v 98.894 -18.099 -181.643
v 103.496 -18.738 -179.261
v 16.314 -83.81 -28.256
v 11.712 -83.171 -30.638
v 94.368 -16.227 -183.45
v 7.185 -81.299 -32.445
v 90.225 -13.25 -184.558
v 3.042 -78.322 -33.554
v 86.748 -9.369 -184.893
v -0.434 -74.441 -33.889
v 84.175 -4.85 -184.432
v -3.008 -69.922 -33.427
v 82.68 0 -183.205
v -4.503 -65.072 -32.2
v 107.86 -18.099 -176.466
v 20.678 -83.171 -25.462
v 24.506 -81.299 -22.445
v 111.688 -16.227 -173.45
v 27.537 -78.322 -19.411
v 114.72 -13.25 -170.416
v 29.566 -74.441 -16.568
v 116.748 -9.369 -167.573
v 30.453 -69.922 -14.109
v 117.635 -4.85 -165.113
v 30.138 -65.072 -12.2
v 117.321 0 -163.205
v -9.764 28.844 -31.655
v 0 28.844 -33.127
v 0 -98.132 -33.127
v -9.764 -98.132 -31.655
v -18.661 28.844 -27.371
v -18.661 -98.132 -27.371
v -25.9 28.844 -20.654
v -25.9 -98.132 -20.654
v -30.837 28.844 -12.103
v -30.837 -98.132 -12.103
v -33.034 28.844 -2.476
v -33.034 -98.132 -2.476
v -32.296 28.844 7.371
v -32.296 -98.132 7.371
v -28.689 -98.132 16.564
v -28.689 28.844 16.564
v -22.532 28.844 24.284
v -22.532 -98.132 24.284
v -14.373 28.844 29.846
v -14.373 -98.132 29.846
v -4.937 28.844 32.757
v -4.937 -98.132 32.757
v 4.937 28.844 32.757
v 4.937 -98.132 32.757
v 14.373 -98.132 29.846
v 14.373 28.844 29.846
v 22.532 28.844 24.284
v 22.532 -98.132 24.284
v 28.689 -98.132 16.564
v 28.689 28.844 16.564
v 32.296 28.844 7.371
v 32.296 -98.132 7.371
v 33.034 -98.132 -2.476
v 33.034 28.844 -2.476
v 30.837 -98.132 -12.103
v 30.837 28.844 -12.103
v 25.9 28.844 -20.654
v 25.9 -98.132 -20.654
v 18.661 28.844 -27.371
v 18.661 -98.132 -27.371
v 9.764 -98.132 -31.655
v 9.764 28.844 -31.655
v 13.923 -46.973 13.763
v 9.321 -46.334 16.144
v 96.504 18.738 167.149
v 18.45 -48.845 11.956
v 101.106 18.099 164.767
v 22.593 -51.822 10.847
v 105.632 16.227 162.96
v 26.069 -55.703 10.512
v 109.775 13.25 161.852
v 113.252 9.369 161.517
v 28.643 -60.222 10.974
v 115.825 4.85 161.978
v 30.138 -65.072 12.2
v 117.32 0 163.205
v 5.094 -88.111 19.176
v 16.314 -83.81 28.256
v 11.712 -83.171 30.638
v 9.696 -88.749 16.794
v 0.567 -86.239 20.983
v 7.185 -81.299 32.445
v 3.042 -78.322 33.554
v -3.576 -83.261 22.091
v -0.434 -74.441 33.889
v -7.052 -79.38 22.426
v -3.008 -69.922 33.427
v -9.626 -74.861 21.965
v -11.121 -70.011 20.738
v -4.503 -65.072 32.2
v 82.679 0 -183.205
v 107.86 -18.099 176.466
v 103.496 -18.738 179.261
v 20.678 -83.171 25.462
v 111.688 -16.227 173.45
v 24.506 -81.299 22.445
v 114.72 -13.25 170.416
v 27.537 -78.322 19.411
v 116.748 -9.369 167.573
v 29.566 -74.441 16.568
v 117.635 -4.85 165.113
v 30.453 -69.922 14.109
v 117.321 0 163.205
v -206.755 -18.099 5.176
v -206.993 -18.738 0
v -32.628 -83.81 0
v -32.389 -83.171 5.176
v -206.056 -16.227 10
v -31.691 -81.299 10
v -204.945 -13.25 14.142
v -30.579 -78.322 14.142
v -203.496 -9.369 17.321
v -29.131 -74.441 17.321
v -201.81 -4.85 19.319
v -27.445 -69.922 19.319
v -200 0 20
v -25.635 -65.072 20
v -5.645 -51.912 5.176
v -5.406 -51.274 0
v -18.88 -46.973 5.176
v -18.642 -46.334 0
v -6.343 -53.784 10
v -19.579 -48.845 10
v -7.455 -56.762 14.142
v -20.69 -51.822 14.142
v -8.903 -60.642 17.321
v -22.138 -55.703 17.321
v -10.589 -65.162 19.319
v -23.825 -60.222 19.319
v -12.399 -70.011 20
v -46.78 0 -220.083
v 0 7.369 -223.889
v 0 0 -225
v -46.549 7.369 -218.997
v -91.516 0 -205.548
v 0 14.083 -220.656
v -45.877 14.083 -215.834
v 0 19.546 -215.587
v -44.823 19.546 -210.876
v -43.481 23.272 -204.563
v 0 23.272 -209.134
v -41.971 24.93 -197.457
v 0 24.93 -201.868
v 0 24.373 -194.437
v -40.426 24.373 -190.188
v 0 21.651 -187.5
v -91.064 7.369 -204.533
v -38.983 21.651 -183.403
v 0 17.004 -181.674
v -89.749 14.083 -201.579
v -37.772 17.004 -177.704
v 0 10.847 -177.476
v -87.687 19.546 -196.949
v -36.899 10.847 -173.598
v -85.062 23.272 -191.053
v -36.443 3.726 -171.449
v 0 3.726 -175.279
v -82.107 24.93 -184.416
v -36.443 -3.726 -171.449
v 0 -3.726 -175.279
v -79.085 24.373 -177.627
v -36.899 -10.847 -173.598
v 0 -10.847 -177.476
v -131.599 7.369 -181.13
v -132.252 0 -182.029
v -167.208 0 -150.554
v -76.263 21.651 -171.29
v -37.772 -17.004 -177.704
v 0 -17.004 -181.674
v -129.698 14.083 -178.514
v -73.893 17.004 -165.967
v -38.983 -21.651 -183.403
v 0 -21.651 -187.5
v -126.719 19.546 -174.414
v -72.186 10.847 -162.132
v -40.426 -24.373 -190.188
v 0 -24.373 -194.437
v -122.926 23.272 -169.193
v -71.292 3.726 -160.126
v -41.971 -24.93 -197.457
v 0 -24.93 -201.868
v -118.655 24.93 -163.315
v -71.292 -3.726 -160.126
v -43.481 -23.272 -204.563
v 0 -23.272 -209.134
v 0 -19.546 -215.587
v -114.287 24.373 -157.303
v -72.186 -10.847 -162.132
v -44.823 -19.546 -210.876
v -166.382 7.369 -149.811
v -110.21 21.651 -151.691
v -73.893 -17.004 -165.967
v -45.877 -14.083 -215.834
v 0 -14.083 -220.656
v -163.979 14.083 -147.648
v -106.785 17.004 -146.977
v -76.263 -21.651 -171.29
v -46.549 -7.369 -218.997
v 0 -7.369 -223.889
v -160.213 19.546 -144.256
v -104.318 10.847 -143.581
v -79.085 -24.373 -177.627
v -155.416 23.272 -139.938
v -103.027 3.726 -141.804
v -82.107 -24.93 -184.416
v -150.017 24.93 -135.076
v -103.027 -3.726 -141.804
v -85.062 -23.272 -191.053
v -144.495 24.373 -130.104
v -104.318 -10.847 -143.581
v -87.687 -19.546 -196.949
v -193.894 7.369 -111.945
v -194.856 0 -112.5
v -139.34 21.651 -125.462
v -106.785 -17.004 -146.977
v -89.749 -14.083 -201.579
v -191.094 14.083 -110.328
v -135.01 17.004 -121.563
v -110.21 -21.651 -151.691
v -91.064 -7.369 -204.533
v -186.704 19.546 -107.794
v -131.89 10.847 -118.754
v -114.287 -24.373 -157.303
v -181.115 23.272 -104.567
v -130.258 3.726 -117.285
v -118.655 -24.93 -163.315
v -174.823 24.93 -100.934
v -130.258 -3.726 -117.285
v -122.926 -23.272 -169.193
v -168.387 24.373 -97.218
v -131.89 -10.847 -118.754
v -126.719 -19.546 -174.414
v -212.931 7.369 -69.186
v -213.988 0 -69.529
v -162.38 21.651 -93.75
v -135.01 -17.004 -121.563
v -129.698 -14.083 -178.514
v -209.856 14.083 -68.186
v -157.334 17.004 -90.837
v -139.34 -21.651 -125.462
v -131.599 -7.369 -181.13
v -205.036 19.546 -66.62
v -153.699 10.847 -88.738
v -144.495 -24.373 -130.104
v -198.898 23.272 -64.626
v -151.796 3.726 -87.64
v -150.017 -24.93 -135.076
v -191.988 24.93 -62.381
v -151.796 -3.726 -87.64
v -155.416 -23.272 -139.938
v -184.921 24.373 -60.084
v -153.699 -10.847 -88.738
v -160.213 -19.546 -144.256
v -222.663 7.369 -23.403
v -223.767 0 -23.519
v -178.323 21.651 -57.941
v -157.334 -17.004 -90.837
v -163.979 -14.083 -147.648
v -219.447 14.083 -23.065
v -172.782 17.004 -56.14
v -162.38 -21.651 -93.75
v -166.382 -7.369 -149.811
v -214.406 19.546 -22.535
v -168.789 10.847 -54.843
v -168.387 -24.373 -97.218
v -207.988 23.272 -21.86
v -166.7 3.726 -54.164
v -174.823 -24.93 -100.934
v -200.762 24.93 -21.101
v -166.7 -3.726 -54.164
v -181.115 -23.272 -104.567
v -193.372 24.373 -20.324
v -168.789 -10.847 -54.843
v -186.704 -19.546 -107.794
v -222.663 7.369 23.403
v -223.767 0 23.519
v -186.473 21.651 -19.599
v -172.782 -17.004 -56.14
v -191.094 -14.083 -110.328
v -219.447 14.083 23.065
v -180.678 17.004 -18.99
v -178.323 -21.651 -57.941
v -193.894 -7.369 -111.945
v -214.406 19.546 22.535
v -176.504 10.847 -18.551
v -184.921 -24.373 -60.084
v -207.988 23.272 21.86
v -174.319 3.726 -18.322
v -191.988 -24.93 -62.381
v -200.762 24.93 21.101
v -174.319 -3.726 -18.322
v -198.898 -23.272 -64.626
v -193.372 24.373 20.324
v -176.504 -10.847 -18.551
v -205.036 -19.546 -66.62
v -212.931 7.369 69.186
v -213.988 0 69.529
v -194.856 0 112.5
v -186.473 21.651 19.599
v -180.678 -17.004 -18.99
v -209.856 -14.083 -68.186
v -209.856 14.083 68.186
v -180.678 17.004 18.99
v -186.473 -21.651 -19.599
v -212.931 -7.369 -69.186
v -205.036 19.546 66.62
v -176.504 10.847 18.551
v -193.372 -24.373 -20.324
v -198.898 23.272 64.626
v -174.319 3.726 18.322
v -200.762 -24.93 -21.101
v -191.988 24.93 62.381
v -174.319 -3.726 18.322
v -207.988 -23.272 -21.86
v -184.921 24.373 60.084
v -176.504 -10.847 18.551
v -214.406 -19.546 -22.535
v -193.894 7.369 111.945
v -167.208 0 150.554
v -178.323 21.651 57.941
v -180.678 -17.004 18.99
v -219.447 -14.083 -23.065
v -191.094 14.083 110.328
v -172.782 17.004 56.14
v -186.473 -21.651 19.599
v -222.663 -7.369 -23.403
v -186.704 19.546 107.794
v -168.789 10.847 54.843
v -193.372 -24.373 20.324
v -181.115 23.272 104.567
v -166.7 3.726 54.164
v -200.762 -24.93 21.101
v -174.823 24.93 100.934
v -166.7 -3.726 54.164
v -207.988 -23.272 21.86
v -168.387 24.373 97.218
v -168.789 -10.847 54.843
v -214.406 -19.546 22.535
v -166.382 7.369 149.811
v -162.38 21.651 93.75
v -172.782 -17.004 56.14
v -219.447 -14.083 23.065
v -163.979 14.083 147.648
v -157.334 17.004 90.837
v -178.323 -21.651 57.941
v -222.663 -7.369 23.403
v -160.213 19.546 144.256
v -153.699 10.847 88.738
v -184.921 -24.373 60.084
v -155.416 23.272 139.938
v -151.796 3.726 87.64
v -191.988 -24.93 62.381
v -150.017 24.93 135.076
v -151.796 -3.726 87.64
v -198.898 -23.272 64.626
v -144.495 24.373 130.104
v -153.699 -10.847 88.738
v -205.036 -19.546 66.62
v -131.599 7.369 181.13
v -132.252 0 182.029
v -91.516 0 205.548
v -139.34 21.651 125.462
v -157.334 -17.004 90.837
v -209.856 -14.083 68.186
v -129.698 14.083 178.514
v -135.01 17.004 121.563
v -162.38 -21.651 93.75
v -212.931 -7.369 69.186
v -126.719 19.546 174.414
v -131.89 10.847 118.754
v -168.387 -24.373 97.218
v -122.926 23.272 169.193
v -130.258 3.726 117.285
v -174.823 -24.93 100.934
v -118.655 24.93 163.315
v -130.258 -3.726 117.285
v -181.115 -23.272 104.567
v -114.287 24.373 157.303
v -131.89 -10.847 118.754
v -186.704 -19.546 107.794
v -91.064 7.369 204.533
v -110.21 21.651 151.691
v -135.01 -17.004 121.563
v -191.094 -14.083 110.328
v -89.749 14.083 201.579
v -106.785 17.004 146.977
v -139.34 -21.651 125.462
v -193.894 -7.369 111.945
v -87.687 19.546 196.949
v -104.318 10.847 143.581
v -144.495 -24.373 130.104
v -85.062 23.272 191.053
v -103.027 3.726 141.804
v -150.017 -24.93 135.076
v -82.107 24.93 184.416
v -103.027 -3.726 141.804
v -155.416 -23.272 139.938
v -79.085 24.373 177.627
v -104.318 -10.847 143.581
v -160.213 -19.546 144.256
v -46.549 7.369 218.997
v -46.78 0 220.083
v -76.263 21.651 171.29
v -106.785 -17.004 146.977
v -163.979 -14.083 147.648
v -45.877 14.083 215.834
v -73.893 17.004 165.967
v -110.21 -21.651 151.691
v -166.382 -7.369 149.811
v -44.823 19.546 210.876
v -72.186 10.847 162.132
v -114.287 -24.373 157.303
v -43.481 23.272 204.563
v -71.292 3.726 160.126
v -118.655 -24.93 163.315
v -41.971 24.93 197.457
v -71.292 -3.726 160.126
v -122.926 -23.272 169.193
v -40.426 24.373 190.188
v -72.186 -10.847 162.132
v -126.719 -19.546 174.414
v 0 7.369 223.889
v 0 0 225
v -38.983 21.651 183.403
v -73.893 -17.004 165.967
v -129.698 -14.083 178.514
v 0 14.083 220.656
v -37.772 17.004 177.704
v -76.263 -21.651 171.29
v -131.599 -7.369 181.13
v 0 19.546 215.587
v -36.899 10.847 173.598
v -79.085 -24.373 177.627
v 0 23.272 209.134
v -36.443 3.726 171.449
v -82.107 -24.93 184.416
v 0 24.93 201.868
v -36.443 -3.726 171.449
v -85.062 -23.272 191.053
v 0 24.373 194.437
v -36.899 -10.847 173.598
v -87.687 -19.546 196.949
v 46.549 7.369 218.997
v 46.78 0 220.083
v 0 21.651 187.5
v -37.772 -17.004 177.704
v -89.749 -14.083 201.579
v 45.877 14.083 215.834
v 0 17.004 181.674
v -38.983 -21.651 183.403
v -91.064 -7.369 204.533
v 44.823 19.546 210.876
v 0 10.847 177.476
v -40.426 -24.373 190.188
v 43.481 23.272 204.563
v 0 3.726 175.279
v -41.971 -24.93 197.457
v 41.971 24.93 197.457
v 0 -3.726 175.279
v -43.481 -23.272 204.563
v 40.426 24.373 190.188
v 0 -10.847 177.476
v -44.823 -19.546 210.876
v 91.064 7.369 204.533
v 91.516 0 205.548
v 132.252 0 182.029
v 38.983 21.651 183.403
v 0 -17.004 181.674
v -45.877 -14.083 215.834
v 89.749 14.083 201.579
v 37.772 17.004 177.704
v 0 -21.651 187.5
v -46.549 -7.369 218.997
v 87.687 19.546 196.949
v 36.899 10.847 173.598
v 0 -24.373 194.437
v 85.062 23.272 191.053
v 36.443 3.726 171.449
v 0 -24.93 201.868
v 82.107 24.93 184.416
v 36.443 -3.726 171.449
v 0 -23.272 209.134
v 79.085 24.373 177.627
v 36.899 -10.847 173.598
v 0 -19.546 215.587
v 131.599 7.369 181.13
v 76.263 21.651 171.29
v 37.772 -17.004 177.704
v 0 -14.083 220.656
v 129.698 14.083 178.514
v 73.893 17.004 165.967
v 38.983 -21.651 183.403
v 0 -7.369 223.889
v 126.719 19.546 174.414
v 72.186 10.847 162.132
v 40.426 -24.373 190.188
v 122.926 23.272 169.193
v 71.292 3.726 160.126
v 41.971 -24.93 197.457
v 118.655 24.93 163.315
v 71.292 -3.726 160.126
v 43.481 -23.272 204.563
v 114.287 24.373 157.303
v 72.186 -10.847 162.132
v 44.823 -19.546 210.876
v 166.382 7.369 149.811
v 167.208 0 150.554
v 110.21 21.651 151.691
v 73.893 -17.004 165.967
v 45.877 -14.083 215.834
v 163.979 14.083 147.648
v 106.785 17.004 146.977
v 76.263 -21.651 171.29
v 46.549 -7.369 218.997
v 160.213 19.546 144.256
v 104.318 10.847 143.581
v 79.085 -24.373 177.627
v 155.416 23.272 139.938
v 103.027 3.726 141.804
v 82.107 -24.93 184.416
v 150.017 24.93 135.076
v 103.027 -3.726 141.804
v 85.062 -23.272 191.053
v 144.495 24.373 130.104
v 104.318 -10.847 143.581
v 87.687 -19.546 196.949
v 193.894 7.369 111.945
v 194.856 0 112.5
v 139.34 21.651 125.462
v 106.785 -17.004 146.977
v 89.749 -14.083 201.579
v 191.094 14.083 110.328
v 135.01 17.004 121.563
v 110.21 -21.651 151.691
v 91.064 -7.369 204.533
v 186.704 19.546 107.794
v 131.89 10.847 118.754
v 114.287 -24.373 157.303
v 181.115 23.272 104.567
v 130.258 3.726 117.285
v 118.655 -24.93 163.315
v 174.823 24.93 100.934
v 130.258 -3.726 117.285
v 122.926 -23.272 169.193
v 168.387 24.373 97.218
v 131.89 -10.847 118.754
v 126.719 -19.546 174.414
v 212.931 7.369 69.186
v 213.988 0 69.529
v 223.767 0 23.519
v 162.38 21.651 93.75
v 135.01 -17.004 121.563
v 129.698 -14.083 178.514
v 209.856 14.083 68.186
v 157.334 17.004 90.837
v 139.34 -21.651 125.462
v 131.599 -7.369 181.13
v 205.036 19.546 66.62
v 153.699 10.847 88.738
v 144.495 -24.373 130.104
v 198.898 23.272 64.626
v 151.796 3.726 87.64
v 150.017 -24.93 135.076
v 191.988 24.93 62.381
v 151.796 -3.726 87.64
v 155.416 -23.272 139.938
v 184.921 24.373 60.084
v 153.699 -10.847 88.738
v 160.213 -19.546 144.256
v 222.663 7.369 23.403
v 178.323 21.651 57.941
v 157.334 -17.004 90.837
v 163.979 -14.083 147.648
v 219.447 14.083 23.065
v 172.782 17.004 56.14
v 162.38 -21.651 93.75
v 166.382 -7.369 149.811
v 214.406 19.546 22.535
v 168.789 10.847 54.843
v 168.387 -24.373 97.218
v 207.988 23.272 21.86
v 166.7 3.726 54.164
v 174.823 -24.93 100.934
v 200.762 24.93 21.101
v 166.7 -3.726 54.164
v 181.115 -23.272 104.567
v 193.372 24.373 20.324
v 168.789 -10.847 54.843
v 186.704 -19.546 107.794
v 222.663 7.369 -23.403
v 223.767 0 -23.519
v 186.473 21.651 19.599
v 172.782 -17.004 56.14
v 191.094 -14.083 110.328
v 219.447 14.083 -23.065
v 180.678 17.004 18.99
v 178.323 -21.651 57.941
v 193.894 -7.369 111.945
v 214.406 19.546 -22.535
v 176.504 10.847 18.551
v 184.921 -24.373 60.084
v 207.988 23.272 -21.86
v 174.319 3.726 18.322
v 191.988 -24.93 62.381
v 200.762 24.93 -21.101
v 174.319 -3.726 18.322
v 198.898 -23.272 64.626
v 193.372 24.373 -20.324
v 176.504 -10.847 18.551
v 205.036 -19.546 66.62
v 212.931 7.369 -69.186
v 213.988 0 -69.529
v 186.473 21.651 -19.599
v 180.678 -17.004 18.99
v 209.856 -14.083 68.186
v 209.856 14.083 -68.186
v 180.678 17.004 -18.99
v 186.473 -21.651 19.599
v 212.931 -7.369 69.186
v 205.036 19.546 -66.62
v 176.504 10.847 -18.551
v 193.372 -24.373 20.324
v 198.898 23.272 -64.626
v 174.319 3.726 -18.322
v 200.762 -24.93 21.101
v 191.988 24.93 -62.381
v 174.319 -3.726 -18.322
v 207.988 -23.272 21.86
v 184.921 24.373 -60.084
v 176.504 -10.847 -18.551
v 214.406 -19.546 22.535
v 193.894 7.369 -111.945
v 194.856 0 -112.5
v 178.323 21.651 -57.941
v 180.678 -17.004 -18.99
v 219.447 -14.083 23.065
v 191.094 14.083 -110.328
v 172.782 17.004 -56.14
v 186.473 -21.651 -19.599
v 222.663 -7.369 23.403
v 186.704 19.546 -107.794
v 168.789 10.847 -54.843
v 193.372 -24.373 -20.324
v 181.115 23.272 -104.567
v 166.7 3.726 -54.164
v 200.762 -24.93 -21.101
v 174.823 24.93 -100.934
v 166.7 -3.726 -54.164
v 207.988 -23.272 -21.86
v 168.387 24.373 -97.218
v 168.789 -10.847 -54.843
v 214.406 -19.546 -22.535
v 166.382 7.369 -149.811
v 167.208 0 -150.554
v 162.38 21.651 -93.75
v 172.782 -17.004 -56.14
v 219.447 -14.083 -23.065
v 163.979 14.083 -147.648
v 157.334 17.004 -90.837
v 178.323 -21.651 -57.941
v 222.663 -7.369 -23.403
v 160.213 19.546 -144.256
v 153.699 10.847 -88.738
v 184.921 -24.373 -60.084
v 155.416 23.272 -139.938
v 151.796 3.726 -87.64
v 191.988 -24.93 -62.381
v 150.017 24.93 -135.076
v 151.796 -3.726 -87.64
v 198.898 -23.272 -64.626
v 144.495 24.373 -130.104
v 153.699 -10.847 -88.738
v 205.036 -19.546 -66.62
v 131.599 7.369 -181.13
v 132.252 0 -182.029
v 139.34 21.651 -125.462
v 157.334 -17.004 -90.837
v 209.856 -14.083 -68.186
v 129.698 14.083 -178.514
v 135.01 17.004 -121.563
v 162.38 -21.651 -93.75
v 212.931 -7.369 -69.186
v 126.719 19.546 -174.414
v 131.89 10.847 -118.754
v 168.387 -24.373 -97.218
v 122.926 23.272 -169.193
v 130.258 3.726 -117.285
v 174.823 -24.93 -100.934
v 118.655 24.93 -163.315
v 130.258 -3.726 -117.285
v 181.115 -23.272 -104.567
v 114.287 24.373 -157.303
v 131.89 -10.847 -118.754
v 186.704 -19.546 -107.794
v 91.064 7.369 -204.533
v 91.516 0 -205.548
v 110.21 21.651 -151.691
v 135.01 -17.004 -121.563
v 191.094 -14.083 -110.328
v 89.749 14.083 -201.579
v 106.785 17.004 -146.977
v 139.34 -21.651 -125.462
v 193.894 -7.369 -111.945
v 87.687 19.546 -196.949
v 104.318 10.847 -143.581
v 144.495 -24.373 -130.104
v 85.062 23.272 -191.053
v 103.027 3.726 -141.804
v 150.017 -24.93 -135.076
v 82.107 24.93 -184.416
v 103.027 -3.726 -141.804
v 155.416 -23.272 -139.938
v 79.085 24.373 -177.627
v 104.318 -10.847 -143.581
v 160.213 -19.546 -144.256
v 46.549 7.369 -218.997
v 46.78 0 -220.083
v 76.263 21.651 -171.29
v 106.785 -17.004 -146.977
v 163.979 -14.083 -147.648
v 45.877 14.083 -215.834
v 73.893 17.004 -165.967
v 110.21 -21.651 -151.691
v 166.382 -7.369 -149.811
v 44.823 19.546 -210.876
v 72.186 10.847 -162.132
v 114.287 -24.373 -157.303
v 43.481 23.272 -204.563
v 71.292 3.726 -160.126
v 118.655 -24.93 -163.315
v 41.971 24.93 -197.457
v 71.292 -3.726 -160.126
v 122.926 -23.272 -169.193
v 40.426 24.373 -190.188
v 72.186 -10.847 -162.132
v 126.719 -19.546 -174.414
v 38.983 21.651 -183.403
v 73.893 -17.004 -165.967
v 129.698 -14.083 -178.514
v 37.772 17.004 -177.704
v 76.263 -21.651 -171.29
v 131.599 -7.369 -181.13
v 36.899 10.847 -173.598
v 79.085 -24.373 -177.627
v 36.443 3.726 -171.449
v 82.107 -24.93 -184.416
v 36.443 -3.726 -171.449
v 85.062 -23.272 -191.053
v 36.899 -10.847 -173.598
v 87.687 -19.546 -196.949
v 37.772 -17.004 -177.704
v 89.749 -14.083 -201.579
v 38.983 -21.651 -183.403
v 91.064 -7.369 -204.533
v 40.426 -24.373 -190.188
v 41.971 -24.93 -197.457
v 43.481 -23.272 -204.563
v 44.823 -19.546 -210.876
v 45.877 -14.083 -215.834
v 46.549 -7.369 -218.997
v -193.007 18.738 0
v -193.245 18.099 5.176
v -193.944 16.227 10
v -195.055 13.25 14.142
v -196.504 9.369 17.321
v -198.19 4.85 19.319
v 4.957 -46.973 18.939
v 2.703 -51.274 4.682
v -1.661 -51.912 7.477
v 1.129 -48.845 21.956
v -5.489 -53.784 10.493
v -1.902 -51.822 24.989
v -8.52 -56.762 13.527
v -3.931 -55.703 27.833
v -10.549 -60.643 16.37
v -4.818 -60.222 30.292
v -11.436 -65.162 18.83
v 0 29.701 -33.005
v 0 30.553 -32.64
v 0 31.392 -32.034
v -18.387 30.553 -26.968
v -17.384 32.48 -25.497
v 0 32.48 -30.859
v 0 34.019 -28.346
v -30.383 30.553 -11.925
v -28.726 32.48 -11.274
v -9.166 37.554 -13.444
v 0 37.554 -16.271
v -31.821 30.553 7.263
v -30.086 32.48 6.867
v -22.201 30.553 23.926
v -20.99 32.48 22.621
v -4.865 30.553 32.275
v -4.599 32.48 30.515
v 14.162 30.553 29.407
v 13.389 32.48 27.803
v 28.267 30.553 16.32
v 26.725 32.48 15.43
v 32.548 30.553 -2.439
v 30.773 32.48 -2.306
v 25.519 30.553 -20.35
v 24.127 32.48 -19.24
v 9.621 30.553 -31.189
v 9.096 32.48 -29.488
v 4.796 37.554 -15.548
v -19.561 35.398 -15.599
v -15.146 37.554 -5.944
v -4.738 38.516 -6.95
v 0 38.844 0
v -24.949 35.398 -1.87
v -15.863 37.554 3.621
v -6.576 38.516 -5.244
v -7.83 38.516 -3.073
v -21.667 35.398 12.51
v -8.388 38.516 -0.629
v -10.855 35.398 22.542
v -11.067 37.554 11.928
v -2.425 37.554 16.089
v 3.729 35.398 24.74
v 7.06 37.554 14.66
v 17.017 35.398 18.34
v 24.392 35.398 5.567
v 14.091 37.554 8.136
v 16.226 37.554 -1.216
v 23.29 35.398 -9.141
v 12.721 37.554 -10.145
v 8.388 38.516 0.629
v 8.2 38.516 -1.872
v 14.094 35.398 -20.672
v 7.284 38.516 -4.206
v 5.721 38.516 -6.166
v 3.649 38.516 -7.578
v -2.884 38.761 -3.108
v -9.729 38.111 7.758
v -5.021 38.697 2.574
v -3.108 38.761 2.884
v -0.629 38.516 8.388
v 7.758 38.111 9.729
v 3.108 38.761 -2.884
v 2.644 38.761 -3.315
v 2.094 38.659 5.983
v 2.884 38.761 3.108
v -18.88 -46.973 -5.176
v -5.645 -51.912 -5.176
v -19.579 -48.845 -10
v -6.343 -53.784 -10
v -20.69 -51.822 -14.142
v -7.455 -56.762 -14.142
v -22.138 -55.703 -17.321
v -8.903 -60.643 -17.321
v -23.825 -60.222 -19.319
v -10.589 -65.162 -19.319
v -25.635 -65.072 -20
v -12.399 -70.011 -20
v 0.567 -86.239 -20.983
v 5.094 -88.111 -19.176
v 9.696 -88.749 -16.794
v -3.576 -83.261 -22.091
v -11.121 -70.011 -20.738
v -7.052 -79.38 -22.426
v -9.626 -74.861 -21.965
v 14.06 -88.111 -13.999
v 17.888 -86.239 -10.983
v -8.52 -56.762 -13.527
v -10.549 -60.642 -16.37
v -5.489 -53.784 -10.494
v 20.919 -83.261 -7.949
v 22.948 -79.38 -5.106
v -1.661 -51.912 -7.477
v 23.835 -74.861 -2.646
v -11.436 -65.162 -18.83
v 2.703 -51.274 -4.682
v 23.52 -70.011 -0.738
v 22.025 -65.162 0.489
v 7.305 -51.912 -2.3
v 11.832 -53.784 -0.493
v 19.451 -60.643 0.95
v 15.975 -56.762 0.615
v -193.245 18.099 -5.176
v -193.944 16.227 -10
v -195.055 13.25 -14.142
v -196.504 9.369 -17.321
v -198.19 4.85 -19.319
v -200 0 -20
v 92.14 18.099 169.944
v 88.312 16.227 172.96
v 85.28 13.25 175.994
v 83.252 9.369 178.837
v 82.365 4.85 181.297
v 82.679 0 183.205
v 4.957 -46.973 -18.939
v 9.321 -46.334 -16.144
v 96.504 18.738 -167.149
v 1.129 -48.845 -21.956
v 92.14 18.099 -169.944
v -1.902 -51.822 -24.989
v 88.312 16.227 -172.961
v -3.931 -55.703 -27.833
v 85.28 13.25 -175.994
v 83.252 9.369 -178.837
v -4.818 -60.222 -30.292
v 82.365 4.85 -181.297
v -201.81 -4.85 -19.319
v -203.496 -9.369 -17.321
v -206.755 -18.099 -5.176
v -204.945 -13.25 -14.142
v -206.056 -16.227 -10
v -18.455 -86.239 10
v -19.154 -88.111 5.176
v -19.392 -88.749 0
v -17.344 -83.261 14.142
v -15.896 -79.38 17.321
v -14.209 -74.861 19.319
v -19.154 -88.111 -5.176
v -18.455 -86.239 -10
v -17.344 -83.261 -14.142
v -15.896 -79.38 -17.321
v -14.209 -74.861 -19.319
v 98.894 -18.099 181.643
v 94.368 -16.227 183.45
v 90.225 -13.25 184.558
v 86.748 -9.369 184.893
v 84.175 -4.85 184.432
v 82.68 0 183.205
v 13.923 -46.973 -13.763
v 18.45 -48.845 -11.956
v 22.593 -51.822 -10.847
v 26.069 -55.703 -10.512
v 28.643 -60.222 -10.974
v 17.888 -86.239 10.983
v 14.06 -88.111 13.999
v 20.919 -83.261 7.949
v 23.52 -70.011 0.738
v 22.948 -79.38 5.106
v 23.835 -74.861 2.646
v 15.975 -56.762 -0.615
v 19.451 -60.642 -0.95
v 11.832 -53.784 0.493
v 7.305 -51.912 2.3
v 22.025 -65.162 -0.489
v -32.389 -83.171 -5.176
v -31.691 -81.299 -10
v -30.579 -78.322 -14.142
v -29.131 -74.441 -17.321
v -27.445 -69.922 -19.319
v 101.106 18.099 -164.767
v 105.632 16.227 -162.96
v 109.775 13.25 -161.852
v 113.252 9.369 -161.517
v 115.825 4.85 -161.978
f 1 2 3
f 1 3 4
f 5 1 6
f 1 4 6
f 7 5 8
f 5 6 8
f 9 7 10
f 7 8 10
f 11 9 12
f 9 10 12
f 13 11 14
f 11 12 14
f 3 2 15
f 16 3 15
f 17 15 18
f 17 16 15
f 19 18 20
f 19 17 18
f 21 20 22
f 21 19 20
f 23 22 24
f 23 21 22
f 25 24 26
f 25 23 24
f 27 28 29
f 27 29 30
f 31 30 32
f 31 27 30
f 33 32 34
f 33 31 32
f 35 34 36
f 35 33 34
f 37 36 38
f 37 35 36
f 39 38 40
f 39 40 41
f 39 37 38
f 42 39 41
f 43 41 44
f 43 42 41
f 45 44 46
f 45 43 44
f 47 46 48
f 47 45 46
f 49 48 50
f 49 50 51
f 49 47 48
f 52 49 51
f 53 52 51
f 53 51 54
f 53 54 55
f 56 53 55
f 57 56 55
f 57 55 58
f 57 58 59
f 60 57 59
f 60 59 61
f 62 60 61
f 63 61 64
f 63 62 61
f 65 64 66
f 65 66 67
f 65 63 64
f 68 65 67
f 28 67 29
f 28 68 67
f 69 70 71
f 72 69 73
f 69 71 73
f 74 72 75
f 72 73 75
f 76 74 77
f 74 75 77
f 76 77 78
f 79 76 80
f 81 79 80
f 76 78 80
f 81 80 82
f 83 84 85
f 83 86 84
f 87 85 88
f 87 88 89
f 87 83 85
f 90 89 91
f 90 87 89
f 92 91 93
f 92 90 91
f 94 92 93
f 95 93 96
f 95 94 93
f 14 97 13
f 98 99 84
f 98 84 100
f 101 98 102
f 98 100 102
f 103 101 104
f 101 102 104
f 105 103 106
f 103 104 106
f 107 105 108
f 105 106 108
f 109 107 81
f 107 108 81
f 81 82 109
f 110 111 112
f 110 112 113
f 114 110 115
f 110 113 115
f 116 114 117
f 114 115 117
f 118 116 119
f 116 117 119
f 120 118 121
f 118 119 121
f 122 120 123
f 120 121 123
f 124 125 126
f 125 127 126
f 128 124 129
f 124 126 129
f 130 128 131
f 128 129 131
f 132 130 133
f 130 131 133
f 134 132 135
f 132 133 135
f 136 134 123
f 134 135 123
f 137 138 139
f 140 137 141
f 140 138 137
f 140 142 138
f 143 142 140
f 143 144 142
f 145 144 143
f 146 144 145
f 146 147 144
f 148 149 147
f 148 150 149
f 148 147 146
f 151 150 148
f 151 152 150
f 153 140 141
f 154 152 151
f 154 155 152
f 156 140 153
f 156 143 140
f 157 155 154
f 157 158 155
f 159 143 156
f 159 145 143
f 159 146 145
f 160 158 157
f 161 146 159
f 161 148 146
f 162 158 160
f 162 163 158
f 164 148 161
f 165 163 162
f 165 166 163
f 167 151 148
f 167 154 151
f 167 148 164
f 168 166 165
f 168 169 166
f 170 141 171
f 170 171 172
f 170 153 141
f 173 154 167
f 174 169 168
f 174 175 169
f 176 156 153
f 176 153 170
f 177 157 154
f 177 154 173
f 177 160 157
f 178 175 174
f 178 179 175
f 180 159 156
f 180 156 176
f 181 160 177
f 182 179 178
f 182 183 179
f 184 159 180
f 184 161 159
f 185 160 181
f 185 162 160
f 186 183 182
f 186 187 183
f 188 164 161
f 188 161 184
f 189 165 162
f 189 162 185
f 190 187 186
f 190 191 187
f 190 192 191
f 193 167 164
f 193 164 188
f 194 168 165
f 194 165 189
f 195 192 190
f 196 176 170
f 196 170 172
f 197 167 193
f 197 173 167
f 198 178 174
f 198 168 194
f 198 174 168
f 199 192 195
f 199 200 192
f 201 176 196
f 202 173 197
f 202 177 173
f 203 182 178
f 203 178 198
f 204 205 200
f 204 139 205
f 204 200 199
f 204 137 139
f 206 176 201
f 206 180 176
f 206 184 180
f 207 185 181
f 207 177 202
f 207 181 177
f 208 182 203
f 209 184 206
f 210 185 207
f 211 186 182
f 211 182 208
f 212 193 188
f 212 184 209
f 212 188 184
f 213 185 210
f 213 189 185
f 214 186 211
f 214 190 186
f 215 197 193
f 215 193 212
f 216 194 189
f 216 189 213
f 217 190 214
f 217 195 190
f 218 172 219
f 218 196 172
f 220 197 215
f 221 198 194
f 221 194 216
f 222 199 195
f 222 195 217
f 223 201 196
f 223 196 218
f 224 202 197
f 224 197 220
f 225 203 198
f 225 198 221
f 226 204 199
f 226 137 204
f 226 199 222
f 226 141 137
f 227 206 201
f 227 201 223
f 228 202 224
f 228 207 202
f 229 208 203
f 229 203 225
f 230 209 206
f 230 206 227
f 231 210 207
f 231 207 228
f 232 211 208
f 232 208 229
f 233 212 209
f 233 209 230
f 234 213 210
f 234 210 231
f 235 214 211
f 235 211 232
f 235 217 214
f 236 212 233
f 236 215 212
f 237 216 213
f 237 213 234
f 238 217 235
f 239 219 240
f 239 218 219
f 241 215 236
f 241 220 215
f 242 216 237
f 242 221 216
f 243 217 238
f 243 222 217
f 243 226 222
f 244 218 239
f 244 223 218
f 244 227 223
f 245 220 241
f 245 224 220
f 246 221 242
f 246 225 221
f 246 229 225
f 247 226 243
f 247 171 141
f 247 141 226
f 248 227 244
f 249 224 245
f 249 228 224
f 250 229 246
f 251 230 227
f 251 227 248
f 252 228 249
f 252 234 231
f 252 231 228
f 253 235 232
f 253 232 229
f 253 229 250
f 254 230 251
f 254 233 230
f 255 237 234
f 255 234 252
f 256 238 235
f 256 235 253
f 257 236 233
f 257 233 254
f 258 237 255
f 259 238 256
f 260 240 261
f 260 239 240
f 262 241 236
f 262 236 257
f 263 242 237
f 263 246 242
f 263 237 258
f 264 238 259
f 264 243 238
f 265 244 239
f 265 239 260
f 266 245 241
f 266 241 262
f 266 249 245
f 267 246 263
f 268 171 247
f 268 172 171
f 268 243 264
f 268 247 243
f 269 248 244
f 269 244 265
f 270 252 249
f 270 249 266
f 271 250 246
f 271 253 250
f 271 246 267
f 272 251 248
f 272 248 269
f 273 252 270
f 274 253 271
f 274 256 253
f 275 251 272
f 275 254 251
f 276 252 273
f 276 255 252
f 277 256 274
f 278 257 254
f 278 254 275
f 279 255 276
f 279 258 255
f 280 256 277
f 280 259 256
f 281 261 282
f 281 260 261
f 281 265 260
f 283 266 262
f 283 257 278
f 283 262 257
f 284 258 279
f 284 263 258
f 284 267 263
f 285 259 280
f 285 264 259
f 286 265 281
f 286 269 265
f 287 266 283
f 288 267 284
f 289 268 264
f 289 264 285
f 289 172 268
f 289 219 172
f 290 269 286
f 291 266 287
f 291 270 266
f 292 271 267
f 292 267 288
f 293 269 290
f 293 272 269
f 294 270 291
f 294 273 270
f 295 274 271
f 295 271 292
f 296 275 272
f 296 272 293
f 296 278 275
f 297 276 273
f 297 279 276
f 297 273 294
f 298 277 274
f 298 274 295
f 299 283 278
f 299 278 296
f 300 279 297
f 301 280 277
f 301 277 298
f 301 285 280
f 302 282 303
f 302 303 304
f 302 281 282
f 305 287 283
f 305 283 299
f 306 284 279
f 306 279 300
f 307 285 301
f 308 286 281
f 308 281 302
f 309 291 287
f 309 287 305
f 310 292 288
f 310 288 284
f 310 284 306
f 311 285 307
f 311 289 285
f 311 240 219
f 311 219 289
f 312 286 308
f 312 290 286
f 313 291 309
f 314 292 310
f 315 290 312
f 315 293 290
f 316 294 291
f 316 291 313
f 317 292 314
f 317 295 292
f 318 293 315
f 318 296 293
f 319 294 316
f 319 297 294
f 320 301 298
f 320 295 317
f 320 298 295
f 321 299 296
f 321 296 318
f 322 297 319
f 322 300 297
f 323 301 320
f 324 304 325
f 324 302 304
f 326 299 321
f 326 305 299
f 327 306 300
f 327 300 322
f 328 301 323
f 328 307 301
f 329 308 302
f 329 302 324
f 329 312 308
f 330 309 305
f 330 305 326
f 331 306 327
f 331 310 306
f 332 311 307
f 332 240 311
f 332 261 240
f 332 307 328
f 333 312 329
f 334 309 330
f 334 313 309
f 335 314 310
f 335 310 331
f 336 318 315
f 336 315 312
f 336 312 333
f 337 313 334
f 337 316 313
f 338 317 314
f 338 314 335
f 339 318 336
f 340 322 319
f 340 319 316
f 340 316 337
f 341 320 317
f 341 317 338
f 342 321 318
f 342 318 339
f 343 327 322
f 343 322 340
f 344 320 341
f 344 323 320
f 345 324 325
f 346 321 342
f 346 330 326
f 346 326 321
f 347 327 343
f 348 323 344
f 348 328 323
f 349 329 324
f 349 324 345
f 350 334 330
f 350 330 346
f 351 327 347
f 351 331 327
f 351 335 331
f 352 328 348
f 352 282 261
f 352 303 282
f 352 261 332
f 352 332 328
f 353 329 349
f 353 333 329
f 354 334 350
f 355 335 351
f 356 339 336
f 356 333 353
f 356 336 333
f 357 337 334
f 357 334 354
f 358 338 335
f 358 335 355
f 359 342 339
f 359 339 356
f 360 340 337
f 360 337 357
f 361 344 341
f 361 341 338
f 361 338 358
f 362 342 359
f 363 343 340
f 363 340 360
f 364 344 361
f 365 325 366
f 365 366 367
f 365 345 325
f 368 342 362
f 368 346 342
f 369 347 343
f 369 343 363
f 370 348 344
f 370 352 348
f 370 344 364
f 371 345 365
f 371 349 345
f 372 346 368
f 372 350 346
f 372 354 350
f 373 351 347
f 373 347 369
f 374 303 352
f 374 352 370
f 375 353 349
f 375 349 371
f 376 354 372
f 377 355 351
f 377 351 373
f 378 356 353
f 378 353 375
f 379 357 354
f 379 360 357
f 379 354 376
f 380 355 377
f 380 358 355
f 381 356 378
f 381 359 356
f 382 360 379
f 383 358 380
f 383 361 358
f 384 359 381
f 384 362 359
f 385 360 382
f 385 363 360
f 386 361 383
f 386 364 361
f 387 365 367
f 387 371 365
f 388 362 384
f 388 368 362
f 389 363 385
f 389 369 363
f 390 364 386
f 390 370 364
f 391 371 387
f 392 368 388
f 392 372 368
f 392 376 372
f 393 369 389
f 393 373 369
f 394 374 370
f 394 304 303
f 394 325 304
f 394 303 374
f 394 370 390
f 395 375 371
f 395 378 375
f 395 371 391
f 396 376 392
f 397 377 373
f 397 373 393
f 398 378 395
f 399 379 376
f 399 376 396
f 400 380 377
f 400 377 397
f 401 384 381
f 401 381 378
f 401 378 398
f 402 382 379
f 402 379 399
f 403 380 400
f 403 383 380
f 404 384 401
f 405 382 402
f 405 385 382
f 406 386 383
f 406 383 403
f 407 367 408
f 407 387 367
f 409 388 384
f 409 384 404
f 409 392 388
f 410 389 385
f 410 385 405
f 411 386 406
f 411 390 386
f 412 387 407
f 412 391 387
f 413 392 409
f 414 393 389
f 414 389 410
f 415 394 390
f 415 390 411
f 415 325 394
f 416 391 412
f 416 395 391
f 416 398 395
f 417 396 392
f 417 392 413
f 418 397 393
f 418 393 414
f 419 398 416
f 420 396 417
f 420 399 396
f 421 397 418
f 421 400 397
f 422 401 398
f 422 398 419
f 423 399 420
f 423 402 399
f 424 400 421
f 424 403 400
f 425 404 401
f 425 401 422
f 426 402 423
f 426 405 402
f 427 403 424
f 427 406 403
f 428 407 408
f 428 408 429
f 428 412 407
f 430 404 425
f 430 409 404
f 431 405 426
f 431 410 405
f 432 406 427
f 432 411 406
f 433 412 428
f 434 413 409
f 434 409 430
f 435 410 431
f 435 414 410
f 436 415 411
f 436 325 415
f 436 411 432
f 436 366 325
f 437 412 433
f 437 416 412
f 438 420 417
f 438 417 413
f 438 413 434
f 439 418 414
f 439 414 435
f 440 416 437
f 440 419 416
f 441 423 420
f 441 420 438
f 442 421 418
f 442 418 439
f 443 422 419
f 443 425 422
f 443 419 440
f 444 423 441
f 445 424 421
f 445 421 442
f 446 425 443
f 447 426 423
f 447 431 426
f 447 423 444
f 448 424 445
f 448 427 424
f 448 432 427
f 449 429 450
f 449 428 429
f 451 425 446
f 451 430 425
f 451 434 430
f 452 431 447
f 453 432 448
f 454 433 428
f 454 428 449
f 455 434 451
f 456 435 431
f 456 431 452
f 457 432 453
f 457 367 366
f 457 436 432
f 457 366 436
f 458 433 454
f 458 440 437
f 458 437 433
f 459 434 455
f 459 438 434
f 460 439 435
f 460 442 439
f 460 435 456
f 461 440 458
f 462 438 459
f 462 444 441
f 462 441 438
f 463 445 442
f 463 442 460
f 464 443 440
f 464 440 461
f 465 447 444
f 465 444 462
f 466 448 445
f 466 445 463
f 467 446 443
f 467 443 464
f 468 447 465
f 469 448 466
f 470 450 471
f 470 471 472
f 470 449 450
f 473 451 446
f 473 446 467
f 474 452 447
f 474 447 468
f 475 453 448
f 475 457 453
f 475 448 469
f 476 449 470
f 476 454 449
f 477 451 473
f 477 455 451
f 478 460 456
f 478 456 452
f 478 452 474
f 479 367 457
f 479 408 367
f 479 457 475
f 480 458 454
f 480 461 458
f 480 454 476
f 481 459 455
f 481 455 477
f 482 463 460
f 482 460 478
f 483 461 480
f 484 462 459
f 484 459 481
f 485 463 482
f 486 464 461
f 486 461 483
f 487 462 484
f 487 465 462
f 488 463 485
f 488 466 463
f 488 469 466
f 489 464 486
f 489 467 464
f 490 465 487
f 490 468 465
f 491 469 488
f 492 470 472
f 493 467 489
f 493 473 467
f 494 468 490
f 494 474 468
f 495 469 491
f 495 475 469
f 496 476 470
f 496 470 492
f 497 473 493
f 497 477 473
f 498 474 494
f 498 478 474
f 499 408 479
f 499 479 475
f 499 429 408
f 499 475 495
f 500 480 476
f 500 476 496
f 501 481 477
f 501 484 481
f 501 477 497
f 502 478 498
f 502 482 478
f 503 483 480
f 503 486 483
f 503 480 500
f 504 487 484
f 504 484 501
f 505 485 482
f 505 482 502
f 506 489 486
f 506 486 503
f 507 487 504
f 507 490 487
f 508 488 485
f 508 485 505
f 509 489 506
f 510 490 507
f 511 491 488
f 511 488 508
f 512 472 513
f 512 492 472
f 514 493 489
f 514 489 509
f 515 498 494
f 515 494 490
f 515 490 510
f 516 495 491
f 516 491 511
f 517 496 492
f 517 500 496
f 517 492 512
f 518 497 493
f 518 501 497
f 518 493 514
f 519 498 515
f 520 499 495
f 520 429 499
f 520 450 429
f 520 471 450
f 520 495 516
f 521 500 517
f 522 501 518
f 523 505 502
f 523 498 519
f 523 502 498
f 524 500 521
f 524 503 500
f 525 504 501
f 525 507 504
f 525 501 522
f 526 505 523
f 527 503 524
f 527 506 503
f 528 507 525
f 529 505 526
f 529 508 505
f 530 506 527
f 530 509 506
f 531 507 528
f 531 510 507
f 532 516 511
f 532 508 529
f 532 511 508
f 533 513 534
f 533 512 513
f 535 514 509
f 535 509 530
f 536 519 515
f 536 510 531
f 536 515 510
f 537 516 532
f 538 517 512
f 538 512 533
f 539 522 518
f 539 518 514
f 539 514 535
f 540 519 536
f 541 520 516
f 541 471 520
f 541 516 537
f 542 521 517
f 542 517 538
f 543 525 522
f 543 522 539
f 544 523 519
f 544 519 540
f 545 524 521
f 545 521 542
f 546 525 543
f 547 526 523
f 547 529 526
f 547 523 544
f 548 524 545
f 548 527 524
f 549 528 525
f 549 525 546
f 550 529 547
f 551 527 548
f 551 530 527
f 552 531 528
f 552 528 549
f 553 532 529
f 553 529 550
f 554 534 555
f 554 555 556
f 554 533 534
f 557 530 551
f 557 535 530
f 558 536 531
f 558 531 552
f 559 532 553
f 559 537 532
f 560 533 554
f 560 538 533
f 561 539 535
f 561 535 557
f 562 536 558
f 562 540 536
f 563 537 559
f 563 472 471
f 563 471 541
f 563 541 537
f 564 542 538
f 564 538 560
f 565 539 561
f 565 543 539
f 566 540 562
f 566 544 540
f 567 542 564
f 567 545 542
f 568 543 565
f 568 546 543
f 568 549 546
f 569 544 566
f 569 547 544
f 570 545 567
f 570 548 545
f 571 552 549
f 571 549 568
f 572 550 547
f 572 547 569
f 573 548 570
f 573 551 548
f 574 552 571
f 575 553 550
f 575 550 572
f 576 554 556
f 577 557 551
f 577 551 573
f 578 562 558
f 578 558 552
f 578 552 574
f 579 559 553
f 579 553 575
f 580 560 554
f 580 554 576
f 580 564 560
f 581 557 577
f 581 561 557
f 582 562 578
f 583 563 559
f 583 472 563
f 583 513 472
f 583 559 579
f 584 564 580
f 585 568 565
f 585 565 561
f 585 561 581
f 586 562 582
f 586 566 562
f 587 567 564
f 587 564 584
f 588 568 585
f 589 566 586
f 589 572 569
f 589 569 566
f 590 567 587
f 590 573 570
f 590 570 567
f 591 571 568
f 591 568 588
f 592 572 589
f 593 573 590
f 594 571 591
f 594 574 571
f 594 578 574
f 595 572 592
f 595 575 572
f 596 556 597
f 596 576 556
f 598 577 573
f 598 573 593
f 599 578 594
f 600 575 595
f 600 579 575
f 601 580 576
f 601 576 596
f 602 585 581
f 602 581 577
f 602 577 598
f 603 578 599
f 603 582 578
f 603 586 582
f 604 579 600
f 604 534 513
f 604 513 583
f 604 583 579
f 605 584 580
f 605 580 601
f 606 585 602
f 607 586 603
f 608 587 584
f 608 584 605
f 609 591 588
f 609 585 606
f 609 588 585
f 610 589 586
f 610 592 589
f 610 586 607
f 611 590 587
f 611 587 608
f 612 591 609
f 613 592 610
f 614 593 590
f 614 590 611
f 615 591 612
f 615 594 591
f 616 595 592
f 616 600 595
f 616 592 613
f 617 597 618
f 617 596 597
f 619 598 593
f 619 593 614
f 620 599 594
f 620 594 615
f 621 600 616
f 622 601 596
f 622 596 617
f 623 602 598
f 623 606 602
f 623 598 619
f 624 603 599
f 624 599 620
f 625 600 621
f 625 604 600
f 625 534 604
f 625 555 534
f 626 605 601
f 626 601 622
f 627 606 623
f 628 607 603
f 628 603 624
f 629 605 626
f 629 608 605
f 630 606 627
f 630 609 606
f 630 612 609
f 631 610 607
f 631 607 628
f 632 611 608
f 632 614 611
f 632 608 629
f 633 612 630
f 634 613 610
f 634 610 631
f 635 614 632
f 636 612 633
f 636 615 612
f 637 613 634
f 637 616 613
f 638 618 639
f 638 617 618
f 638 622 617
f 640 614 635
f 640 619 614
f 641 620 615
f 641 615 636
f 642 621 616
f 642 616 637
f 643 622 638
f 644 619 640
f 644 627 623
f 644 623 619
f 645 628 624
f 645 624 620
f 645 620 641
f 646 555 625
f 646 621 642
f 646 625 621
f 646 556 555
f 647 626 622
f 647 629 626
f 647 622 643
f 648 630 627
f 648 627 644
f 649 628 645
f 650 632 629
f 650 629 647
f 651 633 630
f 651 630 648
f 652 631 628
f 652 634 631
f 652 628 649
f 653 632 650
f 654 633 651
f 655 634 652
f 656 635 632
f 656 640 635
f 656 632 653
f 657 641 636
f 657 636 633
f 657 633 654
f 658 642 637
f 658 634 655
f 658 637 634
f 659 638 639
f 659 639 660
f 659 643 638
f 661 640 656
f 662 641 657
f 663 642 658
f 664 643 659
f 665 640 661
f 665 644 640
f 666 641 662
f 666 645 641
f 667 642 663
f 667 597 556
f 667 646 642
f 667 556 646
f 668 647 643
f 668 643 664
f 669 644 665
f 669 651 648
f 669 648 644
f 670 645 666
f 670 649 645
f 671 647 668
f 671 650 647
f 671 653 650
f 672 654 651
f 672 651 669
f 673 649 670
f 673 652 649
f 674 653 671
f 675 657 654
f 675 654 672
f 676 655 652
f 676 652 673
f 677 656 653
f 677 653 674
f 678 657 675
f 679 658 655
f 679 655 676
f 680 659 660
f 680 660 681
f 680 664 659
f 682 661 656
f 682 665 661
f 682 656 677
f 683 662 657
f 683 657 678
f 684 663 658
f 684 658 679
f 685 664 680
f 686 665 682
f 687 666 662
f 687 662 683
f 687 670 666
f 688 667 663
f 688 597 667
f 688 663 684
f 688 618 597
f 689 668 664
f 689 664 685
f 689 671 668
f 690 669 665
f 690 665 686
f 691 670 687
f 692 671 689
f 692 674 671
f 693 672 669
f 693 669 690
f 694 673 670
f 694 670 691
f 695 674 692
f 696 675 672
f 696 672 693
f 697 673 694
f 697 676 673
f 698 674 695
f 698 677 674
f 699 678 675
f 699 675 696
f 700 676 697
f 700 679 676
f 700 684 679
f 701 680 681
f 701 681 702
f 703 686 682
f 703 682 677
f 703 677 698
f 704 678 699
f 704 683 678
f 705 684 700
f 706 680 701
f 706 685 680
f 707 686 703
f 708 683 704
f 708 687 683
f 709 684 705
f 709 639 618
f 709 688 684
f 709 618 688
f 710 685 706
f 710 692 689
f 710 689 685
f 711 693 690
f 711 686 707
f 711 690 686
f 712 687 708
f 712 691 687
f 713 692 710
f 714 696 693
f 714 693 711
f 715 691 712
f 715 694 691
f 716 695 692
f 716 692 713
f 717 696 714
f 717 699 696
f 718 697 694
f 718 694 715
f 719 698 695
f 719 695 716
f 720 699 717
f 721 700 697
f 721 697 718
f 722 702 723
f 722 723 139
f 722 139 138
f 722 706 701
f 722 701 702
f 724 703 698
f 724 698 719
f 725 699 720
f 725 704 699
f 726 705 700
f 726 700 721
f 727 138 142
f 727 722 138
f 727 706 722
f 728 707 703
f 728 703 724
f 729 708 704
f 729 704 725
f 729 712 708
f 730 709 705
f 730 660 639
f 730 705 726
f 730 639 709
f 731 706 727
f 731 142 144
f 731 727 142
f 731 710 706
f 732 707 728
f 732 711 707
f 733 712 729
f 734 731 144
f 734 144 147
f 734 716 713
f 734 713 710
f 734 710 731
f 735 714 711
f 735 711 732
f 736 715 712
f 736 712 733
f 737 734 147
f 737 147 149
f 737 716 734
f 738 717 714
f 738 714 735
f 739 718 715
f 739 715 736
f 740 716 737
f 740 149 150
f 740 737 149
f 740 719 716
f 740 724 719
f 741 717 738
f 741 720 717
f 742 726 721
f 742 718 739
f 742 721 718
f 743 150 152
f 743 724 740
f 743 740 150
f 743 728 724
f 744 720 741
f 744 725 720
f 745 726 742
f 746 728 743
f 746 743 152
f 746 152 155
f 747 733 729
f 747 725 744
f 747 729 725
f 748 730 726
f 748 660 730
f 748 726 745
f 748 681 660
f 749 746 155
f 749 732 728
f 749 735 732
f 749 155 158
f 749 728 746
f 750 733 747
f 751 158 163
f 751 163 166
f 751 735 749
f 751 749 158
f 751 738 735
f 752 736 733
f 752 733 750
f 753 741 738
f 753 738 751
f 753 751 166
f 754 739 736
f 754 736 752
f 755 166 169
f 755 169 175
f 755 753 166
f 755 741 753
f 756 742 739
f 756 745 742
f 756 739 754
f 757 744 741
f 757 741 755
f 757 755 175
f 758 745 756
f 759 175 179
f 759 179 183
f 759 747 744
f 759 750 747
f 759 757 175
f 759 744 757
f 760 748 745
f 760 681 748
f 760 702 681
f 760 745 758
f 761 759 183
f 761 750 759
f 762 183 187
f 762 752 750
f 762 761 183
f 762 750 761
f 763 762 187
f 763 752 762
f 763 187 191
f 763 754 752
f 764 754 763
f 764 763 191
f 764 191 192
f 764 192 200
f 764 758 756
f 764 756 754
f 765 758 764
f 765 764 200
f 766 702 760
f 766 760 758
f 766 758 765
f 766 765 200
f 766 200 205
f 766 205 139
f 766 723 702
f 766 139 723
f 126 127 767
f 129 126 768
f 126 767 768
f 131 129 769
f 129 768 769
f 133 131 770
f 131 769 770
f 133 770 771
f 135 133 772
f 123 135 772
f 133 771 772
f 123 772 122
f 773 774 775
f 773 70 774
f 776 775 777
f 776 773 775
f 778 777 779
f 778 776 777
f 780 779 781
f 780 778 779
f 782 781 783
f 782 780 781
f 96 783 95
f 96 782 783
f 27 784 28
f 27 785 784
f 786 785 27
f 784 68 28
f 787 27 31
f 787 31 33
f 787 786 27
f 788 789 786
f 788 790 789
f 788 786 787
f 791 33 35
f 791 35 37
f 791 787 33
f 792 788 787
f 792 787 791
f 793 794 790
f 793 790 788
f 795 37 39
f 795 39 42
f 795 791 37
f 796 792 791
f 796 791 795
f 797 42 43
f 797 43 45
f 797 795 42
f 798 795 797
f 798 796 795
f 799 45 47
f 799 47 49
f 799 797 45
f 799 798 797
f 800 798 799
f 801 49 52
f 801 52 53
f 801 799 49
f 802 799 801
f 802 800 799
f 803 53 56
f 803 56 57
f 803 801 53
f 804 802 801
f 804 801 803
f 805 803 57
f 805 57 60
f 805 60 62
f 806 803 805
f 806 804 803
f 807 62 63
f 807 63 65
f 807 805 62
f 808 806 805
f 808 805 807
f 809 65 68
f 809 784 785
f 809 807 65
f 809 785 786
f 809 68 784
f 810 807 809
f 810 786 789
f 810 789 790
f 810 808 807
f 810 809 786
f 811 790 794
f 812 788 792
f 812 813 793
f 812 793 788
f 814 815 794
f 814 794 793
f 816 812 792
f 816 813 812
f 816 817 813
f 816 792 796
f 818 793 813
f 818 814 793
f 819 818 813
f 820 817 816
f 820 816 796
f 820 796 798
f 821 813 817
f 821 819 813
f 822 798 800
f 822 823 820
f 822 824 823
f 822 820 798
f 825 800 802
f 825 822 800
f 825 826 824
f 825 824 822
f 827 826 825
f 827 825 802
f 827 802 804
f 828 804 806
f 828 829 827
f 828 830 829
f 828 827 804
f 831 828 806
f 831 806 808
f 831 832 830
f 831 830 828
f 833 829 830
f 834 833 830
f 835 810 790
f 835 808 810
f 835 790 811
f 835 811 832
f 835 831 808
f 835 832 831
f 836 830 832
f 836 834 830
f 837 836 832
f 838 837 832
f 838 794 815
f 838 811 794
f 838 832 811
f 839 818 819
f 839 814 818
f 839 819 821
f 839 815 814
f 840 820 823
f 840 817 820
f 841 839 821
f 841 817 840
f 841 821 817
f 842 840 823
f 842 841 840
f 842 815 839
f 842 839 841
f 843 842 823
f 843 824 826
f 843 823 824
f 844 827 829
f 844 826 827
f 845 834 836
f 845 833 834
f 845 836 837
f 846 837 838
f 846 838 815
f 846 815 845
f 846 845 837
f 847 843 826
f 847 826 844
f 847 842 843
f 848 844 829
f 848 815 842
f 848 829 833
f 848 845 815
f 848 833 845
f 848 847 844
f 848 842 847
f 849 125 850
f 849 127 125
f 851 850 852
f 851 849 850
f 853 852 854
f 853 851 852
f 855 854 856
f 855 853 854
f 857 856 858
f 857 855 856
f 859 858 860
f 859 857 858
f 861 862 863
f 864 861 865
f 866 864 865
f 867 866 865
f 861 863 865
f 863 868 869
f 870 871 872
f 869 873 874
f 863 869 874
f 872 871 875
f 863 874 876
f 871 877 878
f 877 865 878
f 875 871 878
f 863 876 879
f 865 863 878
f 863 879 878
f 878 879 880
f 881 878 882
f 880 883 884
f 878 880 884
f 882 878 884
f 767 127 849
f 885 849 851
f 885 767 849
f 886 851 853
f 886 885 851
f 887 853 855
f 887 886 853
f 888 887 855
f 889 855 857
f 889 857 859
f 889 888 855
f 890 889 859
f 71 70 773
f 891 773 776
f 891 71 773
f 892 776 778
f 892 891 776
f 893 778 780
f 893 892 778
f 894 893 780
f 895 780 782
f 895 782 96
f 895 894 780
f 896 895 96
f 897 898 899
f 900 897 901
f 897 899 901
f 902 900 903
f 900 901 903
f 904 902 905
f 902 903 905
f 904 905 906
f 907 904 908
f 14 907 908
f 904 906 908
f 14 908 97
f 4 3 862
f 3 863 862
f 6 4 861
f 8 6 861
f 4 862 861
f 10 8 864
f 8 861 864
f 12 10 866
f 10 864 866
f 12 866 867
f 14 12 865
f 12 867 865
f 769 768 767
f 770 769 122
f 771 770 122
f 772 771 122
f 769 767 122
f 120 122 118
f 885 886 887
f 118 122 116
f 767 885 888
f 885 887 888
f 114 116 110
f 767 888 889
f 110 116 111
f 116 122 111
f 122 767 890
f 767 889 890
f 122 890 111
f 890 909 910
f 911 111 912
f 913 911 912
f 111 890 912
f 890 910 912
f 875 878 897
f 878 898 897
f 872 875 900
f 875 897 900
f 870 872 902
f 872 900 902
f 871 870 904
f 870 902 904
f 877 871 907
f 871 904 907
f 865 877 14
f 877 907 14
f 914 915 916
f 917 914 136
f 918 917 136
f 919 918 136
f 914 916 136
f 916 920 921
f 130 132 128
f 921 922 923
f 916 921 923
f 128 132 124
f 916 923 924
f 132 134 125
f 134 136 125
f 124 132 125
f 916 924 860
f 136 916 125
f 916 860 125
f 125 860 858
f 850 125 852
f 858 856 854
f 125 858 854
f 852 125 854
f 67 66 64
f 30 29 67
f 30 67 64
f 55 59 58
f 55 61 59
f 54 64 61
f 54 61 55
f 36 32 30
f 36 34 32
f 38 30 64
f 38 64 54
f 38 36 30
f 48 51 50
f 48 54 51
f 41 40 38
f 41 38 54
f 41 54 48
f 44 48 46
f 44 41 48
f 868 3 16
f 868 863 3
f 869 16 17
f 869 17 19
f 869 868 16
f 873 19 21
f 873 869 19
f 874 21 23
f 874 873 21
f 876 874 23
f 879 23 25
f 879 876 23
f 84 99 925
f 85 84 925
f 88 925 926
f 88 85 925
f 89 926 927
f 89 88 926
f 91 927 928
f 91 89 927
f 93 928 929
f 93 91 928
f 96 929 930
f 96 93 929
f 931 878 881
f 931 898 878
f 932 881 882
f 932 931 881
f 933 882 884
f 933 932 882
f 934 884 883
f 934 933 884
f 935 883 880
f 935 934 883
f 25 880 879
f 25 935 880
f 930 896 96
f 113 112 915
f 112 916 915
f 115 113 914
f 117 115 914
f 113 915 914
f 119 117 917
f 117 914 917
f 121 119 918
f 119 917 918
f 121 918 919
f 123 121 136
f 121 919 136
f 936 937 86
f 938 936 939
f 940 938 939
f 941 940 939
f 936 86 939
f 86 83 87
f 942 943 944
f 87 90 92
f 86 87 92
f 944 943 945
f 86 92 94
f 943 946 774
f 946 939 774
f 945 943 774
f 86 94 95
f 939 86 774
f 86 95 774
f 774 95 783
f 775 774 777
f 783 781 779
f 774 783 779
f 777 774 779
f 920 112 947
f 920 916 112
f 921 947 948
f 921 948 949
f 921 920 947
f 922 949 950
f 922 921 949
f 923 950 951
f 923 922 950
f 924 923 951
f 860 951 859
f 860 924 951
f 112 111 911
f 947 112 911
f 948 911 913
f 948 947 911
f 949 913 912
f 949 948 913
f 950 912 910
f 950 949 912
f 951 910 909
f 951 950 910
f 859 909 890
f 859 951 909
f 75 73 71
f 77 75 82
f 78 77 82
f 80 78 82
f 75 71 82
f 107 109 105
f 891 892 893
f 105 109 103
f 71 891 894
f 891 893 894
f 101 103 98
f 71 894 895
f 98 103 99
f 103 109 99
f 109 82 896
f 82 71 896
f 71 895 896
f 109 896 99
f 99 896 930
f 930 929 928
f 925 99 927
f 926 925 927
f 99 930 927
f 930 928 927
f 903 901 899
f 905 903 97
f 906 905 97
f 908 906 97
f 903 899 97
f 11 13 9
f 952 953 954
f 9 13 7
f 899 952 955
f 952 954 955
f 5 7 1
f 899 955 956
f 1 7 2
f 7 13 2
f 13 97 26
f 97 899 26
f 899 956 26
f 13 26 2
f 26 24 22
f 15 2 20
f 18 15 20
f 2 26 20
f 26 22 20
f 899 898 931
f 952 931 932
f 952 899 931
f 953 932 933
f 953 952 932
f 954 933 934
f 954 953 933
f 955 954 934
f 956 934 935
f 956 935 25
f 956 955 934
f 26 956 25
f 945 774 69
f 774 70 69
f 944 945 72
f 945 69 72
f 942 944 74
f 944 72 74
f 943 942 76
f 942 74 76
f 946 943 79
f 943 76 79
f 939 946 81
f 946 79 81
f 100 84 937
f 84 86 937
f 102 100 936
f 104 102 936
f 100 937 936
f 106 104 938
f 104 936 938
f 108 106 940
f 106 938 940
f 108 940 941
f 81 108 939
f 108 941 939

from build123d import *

# Parameters (mm, degrees)
SKETCH1_R                = 25
SKETCH1_W                = 33.127050545
SKETCH1_H                = 126.975324737
DOME1_FACE_RADIUS        = 33.127050545
DOME1_HEIGHT             = 10
BOSS_EXTRUDE1_DEPTH      = 20
BOSS_EXTRUDE1_DEPTH_BACK = 20
FILLET1_R                = 20
FILLET2_R                = 20
CIRPATTERN2_COUNT        = 3


with BuildPart() as part:
    # Sketch1 → Revolve1 (revolve)
    with BuildSketch(Plane.XY, mode=Mode.PRIVATE) as revolve1_sk:
        with Locations((200, 0)):
            Circle(SKETCH1_R)
        with Locations((16.563525273, -34.644113748)):
            Rectangle(SKETCH1_W, SKETCH1_H)
    revolve(revolve1_sk.sketch.rotate(Axis((0, -98.131776117, 0), (0, 1, 0)), 90), axis=Axis((0, -98.131776117, 0), (0, 1, 0)))

    # Dome1: an elliptical dome of height H over a round flat face of radius A is half a spheroid: the quarter ellipse of half axes A and H revolved about the face's axis
    with BuildSketch(Plane((0, 28.84354862, 0), x_dir=(0, 0, -1), z_dir=(1, 0, 0)), mode=Mode.PRIVATE) as dome1_quarter:
        Ellipse(DOME1_FACE_RADIUS, DOME1_HEIGHT)
        Rectangle(DOME1_FACE_RADIUS, DOME1_HEIGHT, align=(Align.MIN, Align.MIN), mode=Mode.INTERSECT)
    revolve(dome1_quarter.sketch, axis=Axis((0, 28.84354862, 0), (0, 1, 0)))


with BuildPart() as body_2:
    # Sketch2 → Boss-Extrude1 (new, two sides: drawn at the far end of the back side and taken through both)
    with BuildSketch(Plane.XY.offset(-BOSS_EXTRUDE1_DEPTH_BACK)):
        Polygon((-206.992781228, -18.737689578), (-32.627553009, -83.80963399), (-19.392036111, -88.749040939), (-5.406473656, -51.273661784), (-18.641990554, -46.334254835), (-193.007218772, 18.737689578), align=None)
    extrude(amount=BOSS_EXTRUDE1_DEPTH + BOSS_EXTRUDE1_DEPTH_BACK)

    # Fillet1
    fillet1_edges = [body_2.edges().sort_by_distance(p)[0] for p in [
        (-113.192408669, -53.743365258, -20),
        (-99.206846214, -16.267986103, 20),
        (-113.192408669, -53.743365258, 20),
    ]]
    fillet(fillet1_edges, radius=FILLET1_R - 0.0001)  # a hair under: the kernel refuses the full size

    # Fillet2
    fillet2_edges = [body_2.edges().sort_by_distance(p)[0] for p in [
        (-99.206846214, -16.267986103, -20),
    ]]
    fillet(fillet2_edges, radius=FILLET2_R)


with BuildPart() as cirpattern2_1:
    # CirPattern2: pattern copy
    add(body_2.part.rotate(Axis((0, 0, 0), (0, 1, 0)), 1 * 360 / CIRPATTERN2_COUNT))


with BuildPart() as cirpattern2_2:
    # CirPattern2: pattern copy
    add(body_2.part.rotate(Axis((0, 0, 0), (0, 1, 0)), 2 * 360 / CIRPATTERN2_COUNT))


solid = Compound([part.part, body_2.part, cirpattern2_1.part, cirpattern2_2.part])
